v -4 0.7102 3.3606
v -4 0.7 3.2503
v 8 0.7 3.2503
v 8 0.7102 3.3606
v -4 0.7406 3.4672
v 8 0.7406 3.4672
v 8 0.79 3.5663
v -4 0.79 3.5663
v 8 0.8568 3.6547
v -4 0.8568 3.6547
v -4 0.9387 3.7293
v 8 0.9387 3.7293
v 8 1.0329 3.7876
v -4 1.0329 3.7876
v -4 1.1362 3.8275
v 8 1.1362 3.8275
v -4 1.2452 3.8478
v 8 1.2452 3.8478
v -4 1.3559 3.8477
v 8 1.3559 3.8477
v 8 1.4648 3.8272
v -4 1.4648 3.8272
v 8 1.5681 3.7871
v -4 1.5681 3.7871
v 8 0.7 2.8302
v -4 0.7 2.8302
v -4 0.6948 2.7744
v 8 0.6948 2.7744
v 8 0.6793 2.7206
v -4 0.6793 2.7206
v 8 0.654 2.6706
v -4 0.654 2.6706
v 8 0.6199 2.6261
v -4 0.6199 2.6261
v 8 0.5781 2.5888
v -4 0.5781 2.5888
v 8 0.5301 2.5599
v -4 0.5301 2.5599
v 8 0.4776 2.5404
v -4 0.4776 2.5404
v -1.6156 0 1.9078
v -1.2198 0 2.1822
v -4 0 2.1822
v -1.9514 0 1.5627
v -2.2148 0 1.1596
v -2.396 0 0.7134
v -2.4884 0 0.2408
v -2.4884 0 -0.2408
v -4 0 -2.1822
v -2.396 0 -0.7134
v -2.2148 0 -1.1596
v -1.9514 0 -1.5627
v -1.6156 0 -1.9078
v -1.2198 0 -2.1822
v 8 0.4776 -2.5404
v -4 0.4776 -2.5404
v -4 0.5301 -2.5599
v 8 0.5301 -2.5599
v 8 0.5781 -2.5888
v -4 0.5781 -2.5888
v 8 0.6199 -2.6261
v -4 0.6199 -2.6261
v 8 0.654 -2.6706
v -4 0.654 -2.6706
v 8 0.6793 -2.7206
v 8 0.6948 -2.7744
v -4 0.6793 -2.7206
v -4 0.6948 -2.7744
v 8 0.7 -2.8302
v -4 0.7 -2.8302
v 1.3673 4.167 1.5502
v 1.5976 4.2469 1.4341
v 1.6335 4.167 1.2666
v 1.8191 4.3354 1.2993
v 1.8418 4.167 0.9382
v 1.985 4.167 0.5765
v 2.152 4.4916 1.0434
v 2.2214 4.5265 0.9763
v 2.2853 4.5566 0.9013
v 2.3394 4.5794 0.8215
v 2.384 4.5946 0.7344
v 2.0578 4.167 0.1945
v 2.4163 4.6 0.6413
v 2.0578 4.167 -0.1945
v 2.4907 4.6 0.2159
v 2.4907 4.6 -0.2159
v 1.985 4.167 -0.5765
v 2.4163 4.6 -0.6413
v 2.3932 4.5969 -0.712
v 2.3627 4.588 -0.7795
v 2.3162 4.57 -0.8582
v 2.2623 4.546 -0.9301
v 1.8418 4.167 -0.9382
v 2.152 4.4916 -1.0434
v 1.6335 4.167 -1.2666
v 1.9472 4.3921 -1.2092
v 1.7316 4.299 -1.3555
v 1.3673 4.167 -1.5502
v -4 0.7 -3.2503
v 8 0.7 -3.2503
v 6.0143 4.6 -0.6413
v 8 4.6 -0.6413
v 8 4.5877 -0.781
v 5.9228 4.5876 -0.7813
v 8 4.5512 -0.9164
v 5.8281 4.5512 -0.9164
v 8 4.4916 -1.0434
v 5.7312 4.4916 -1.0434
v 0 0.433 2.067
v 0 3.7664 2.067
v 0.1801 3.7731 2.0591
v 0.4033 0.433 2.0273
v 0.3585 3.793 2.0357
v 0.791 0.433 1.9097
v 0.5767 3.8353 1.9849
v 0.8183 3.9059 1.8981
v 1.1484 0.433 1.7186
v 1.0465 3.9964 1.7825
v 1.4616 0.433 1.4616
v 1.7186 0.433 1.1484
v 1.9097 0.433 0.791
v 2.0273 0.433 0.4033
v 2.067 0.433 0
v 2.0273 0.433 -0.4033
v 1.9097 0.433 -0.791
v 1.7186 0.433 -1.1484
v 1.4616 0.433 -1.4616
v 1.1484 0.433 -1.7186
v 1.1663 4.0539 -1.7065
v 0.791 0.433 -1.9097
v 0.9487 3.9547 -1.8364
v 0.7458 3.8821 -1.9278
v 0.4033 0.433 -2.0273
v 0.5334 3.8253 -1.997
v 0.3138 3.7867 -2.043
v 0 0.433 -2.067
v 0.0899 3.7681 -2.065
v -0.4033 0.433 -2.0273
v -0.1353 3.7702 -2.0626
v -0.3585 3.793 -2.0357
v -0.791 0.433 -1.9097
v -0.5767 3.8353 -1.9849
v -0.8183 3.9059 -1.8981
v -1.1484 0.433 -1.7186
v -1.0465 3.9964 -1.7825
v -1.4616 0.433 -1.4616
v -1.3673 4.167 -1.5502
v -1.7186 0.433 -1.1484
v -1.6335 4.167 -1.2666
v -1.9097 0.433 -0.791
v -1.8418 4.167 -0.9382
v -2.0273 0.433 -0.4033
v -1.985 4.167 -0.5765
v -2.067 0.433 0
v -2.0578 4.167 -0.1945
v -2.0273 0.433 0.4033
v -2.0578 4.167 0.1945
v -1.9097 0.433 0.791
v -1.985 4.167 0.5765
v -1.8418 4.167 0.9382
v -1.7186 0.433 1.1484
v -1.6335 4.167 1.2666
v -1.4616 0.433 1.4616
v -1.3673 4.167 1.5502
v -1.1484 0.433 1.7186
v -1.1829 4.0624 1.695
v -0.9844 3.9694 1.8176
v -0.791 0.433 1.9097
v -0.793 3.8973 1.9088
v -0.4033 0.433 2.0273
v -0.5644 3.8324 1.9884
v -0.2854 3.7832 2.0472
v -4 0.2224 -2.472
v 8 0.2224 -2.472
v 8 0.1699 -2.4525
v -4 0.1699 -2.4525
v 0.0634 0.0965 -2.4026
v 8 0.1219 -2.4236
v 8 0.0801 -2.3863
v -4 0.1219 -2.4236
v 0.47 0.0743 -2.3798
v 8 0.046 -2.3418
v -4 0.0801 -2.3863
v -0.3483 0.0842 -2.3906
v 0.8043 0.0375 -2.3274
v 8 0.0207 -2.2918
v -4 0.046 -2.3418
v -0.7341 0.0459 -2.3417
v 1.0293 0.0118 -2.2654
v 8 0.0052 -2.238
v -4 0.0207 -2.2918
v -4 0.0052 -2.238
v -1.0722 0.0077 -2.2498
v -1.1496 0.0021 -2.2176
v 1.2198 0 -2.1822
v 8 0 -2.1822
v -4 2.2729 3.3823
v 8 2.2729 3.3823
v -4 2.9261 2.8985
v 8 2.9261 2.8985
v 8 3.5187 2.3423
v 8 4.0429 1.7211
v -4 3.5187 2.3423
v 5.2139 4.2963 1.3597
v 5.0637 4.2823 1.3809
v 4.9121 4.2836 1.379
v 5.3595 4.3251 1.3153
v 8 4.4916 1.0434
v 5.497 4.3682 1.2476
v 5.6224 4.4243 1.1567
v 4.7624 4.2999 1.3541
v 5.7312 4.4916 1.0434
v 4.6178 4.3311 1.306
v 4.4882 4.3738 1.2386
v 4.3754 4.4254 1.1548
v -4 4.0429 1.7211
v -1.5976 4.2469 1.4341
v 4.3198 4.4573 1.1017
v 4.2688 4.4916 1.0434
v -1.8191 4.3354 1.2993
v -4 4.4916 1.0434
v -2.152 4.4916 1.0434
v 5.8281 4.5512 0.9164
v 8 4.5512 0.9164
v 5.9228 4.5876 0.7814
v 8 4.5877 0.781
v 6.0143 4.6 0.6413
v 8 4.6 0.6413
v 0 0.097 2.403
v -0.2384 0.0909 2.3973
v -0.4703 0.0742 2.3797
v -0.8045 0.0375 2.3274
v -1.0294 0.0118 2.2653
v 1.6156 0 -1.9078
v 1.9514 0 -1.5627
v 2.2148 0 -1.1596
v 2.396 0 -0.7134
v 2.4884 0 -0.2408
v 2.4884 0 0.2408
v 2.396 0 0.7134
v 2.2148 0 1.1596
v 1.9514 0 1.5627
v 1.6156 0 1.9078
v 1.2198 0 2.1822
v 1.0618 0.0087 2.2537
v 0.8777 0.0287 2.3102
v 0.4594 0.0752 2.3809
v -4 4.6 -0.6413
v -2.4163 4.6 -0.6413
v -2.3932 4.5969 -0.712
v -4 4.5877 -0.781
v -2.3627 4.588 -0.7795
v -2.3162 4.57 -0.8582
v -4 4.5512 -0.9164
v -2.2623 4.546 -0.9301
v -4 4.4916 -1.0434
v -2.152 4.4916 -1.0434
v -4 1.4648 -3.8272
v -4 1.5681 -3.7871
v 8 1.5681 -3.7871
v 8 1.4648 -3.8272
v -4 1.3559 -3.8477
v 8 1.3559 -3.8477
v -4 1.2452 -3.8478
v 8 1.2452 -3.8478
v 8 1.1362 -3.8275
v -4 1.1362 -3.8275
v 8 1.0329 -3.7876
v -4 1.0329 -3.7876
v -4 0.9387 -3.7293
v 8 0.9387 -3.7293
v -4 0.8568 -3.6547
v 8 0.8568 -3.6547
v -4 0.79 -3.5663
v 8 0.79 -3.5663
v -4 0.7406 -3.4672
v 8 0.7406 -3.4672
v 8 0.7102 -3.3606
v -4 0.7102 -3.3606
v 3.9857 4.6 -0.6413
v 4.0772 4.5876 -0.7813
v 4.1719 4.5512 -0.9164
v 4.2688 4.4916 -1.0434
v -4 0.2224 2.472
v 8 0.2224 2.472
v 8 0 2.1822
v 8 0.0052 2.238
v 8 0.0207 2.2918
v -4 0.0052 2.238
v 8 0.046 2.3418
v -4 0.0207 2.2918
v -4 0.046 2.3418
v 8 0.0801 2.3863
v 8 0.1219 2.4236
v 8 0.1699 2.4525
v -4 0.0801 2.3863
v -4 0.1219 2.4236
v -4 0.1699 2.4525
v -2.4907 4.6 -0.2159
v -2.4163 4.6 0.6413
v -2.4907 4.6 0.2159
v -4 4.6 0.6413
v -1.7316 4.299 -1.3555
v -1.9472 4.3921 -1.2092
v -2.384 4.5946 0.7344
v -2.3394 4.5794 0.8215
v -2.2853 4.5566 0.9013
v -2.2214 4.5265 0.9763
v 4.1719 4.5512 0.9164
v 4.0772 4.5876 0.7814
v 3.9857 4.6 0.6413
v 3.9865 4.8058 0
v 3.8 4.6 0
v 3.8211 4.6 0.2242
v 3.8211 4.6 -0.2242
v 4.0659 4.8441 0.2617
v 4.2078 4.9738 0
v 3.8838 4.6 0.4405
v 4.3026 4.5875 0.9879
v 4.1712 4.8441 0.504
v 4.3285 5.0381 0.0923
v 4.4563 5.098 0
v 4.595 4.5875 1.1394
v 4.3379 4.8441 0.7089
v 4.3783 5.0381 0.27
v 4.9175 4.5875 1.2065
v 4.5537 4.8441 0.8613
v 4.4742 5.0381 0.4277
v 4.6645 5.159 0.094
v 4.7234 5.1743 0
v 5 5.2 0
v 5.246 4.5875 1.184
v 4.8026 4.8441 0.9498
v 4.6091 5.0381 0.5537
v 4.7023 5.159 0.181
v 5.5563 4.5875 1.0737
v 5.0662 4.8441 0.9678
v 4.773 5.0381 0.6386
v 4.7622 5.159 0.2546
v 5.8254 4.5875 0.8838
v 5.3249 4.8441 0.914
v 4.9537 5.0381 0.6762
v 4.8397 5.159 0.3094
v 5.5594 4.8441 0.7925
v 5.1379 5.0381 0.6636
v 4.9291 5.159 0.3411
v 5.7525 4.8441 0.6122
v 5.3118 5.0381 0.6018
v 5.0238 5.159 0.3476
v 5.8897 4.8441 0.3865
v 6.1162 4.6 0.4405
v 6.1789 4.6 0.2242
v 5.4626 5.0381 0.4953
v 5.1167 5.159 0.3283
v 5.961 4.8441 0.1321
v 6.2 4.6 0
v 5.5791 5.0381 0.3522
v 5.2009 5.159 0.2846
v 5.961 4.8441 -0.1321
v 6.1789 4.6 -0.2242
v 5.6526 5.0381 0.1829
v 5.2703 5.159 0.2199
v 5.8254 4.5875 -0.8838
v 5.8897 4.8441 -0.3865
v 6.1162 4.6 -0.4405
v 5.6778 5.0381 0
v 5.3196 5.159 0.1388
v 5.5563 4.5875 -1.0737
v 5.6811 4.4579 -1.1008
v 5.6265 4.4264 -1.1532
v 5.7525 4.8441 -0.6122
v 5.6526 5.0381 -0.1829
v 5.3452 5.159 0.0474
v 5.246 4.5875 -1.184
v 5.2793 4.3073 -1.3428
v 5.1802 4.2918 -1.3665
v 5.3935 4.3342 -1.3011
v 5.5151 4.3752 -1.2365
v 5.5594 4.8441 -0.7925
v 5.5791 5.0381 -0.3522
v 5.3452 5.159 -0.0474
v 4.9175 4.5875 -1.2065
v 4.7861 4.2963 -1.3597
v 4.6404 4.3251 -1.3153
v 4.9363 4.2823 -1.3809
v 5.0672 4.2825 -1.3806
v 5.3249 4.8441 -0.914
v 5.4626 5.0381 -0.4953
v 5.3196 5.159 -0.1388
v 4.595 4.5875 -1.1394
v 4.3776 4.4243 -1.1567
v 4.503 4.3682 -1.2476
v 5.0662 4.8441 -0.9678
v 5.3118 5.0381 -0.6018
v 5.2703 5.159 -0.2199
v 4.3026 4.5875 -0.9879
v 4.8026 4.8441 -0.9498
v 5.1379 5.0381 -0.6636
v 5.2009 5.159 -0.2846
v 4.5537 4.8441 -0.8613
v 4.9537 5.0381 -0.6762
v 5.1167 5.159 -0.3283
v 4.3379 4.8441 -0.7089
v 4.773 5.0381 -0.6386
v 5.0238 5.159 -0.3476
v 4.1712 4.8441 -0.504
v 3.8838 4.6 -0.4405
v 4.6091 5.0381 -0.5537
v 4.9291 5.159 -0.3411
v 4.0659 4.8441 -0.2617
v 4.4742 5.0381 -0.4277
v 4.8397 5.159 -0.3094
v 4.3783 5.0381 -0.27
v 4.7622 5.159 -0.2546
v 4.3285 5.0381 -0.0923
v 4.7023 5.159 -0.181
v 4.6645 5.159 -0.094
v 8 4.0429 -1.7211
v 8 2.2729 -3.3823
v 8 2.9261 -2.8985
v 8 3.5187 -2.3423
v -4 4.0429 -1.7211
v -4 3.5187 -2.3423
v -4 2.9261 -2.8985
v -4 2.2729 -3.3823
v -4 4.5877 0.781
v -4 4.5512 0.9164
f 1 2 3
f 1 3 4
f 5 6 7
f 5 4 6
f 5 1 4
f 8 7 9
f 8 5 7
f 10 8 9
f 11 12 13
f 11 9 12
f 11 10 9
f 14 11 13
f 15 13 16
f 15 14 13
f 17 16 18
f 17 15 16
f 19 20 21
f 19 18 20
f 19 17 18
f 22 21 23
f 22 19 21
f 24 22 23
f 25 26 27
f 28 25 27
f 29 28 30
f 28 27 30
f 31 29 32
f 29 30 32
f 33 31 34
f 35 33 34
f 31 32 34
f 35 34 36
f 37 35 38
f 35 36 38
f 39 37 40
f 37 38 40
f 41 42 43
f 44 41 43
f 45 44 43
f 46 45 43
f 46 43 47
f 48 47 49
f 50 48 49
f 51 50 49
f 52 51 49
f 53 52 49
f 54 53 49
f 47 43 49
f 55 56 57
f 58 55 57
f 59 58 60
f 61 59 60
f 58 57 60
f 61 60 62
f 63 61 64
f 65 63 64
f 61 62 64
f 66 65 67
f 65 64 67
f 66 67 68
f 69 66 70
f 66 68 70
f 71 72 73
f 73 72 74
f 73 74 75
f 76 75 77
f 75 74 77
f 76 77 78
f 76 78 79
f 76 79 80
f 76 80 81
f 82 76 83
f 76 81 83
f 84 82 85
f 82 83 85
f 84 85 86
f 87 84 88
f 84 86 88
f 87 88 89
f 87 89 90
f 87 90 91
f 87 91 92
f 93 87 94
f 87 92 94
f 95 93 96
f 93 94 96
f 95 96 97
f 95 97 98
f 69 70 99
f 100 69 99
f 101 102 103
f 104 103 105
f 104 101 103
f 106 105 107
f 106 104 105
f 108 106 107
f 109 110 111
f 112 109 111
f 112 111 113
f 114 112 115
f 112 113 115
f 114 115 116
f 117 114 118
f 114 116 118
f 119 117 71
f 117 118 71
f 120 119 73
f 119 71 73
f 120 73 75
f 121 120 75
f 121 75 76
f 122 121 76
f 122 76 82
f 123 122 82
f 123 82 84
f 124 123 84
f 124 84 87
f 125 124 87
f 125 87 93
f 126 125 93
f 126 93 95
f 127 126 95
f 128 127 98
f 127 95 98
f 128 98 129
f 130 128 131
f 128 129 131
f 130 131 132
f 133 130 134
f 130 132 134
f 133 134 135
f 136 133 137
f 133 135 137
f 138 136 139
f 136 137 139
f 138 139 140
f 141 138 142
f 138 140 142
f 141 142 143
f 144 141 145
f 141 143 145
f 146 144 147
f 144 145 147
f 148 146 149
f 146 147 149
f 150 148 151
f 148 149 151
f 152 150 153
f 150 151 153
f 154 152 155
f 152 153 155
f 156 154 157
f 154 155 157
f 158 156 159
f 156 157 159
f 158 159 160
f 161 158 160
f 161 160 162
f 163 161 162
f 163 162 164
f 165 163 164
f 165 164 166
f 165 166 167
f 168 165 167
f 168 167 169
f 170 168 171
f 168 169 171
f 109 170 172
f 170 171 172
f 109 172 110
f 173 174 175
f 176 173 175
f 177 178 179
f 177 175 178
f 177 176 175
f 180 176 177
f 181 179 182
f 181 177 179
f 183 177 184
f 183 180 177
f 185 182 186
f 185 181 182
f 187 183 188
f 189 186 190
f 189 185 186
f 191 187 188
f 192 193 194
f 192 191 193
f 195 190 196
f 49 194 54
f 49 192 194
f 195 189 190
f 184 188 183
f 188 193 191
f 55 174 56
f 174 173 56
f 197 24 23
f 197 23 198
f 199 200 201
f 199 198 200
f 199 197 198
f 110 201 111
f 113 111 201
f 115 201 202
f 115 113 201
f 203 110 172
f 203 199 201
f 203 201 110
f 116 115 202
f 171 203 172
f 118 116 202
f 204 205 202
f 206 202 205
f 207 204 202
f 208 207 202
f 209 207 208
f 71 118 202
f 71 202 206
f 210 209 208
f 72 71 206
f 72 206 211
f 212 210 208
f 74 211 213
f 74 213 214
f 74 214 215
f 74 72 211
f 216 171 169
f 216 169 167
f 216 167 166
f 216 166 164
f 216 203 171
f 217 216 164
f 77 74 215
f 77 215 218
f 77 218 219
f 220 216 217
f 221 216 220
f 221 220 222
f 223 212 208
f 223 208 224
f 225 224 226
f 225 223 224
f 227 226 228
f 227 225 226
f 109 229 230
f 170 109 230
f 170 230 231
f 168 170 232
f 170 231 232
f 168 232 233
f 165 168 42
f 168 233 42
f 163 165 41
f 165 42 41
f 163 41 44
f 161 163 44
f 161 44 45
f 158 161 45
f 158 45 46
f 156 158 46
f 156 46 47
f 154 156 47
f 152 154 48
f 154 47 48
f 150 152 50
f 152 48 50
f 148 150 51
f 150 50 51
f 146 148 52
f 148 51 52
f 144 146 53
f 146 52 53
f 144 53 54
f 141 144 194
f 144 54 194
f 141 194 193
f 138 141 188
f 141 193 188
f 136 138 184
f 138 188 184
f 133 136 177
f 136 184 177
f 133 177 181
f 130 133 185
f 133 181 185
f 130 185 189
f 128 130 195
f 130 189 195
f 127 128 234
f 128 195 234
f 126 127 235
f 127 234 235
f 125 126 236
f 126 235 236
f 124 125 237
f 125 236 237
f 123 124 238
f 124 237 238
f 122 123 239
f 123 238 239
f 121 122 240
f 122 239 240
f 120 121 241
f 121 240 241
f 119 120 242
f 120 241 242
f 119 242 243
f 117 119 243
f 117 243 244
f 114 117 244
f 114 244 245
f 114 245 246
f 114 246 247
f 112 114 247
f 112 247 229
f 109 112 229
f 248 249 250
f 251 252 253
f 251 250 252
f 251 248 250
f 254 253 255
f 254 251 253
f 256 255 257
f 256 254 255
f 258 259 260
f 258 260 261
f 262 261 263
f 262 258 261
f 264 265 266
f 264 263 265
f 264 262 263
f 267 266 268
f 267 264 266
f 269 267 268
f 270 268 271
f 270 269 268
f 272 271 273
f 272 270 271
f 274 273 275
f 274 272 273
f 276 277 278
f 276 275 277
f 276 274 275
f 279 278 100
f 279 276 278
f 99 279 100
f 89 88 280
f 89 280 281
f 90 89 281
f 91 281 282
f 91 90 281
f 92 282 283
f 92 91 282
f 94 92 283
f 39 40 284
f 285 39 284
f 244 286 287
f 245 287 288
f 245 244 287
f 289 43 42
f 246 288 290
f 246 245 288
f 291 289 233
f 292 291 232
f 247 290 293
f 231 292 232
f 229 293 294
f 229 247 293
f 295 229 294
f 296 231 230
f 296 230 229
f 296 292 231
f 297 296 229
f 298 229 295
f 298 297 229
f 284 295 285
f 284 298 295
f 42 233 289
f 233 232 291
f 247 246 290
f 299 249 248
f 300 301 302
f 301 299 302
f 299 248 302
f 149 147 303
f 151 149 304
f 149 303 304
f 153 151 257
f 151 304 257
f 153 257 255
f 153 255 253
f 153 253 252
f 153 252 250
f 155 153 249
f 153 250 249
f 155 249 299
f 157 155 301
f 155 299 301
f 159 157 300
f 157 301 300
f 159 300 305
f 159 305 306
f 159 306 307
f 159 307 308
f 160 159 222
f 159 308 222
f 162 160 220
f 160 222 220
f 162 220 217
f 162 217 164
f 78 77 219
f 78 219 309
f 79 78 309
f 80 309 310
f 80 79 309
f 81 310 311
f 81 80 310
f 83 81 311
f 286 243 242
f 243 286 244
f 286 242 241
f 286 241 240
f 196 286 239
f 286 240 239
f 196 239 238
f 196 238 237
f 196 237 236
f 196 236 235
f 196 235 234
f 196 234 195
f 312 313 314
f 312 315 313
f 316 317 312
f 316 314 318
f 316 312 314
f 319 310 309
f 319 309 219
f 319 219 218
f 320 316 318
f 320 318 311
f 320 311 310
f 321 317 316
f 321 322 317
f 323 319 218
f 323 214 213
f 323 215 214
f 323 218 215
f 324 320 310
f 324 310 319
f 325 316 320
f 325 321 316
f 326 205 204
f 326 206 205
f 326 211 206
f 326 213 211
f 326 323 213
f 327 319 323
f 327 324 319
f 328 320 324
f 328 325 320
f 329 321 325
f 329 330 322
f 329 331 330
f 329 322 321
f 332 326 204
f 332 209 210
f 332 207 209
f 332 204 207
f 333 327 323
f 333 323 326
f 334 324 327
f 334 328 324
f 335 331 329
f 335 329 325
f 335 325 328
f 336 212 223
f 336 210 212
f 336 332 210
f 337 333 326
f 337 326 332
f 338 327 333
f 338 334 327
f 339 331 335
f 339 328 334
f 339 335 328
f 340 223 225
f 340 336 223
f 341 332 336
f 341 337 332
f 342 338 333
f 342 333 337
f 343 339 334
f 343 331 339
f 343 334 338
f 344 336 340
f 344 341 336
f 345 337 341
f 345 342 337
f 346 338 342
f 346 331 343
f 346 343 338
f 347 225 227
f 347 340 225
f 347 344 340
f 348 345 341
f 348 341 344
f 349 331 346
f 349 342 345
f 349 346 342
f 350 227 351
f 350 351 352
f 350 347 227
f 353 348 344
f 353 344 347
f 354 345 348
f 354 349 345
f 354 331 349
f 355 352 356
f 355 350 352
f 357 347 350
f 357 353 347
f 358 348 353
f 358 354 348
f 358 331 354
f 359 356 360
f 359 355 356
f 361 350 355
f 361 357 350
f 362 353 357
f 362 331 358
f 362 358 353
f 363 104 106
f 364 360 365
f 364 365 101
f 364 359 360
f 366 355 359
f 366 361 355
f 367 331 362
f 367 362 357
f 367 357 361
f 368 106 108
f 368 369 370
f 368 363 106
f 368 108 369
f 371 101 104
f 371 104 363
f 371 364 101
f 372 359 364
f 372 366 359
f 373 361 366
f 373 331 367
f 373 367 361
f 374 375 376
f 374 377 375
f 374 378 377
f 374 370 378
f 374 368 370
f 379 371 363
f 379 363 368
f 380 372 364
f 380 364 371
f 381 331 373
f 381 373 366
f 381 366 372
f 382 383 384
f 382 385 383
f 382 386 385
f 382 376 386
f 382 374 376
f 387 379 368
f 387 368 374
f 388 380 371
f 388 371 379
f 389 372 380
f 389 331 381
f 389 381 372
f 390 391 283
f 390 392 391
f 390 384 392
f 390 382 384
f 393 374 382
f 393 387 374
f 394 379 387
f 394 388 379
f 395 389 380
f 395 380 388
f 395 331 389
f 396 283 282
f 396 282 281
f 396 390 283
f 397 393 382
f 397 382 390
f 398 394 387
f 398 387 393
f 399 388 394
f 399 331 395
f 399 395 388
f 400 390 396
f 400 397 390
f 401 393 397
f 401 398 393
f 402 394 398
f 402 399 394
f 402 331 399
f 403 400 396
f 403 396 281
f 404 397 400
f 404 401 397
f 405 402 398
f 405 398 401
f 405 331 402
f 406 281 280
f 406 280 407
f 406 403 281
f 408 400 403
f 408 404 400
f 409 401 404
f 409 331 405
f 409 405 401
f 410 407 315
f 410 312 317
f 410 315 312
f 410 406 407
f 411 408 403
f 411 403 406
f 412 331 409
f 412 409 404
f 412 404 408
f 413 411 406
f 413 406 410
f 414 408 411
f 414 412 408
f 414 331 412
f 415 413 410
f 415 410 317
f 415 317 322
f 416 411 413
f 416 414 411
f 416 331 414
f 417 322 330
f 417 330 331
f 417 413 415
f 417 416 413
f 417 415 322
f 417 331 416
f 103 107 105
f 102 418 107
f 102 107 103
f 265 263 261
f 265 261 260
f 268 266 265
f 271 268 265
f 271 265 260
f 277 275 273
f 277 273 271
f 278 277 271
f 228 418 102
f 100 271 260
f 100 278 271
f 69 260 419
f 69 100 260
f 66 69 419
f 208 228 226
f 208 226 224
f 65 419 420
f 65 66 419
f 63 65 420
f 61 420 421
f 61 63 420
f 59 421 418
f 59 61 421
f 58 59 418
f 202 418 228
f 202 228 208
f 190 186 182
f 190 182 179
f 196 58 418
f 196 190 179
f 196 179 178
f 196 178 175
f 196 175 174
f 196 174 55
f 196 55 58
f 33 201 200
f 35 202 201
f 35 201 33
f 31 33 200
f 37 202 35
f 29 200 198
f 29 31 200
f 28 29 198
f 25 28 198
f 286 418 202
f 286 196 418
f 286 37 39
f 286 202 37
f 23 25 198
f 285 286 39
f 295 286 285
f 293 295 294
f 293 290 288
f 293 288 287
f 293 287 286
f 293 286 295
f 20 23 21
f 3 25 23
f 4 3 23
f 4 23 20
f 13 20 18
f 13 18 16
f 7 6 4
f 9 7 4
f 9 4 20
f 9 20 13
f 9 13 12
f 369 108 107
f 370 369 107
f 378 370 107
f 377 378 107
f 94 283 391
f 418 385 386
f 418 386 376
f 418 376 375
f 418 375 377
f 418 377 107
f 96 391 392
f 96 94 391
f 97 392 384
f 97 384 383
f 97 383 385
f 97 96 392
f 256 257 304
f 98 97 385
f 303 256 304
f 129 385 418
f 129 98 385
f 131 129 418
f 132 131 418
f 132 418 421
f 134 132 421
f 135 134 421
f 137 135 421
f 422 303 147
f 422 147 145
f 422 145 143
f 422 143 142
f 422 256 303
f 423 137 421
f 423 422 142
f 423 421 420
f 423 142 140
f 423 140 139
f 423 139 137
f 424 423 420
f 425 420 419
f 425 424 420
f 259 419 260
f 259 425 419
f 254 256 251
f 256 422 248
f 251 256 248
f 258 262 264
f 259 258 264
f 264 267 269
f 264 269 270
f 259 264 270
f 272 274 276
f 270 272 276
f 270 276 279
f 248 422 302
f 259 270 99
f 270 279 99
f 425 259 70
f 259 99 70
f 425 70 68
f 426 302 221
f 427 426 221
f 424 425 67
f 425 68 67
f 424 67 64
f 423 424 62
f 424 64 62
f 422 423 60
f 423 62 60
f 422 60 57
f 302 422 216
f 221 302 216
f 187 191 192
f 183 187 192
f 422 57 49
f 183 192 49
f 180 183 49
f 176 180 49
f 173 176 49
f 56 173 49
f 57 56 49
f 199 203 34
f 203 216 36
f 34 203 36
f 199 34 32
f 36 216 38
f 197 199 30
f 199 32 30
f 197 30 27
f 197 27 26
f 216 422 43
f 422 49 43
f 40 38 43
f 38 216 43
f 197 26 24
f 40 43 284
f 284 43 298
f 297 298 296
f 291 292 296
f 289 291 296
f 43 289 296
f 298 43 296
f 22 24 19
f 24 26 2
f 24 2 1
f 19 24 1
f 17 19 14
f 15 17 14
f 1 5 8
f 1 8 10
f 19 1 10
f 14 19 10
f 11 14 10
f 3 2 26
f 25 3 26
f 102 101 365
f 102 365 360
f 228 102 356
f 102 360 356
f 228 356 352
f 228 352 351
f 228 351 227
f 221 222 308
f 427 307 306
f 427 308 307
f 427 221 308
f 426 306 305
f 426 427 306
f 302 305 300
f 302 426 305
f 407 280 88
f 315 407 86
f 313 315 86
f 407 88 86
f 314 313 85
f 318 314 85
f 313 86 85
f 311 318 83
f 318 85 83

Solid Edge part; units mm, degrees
sketch "Sketch1" plane through (-4, 0, 0) normal (1, 0, 0) x (0, 1, 0)
  arc A0 (1.5681, 3.7871) -> (0.7, 3.2503) centre (1.3, 3.2503) ccw
  line L0 (0.7, 3.2503) -> (0.7, 2.8302)
  arc A1 (0.7, 2.8302) -> (0.4776, 2.5404) centre (0.4, 2.8302) cw
  line L1 (0.4776, 2.5404) -> (0.2224, 2.472)
  arc A2 (0.2224, 2.472) -> (0, 2.1822) centre (0.3, 2.1822) ccw
  line L2 (0, 2.1822) -> (0, -2.1822)
  arc A3 (0, -2.1822) -> (0.2224, -2.472) centre (0.3, -2.1822) ccw
  line L3 (0.2224, -2.472) -> (0.4776, -2.5404)
  arc A4 (0.4776, -2.5404) -> (0.7, -2.8302) centre (0.4, -2.8302) cw
  line L4 (0.7, -2.8302) -> (0.7, -3.2503)
  arc A5 (0.7, -3.2503) -> (1.5681, -3.7871) centre (1.3, -3.2503) ccw
  arc A6 (1.5681, -3.7871) -> (4.4916, -1.0434) centre (-1.5598, 2.4752) ccw
  arc A7 (4.4916, -1.0434) -> (4.6, -0.6413) centre (3.8, -0.6413) ccw
  line L5 (4.6, -0.6413) -> (4.6, 0.6413)
  arc A8 (4.6, 0.6413) -> (4.4916, 1.0434) centre (3.8, 0.6413) ccw
  arc A9 (4.4916, 1.0434) -> (1.5681, 3.7871) centre (-1.5598, -2.4752) ccw
extrude "ExtrudedProtrusion_1" add sketch "Sketch1" along normal blind 12
sketch "Sketch2" plane through (0, 0, 0) normal (1, 0, 0) x (0, 1, 0)
  line L0 (0, 0) -> (0, 2.5)
  line L1 (0, 2.5) -> (0.433, 2.067)
  line L2 (0.433, 2.067) -> (4.167, 2.067)
  line L3 (4.167, 2.067) -> (4.6, 2.5)
  line L4 (4.6, 2.5) -> (4.6, 0)
  line L5 (4.6, 0) -> (0, 0)
revolve "RevolvedCutout1" cut sketch "Sketch2" angle 360 about axis through (0, 4.6, 0) along (0, -1, 0)
sketch "Sketch3" plane through (0, 0, 0) normal (0, 0, 1) x (1, 0, 0)
  arc A0 (5, 2.2) -> (5, 5.2) centre (5, 3.7) cw
  line L0 (5, 5.2) -> (5, 2.2)
revolve "RevolvedProtrusion1" add sketch "Sketch3" angle 360 about axis through (5, 5.2, 0) along (0, -1, 0)
properties part number "150914 NST-5-M5"
